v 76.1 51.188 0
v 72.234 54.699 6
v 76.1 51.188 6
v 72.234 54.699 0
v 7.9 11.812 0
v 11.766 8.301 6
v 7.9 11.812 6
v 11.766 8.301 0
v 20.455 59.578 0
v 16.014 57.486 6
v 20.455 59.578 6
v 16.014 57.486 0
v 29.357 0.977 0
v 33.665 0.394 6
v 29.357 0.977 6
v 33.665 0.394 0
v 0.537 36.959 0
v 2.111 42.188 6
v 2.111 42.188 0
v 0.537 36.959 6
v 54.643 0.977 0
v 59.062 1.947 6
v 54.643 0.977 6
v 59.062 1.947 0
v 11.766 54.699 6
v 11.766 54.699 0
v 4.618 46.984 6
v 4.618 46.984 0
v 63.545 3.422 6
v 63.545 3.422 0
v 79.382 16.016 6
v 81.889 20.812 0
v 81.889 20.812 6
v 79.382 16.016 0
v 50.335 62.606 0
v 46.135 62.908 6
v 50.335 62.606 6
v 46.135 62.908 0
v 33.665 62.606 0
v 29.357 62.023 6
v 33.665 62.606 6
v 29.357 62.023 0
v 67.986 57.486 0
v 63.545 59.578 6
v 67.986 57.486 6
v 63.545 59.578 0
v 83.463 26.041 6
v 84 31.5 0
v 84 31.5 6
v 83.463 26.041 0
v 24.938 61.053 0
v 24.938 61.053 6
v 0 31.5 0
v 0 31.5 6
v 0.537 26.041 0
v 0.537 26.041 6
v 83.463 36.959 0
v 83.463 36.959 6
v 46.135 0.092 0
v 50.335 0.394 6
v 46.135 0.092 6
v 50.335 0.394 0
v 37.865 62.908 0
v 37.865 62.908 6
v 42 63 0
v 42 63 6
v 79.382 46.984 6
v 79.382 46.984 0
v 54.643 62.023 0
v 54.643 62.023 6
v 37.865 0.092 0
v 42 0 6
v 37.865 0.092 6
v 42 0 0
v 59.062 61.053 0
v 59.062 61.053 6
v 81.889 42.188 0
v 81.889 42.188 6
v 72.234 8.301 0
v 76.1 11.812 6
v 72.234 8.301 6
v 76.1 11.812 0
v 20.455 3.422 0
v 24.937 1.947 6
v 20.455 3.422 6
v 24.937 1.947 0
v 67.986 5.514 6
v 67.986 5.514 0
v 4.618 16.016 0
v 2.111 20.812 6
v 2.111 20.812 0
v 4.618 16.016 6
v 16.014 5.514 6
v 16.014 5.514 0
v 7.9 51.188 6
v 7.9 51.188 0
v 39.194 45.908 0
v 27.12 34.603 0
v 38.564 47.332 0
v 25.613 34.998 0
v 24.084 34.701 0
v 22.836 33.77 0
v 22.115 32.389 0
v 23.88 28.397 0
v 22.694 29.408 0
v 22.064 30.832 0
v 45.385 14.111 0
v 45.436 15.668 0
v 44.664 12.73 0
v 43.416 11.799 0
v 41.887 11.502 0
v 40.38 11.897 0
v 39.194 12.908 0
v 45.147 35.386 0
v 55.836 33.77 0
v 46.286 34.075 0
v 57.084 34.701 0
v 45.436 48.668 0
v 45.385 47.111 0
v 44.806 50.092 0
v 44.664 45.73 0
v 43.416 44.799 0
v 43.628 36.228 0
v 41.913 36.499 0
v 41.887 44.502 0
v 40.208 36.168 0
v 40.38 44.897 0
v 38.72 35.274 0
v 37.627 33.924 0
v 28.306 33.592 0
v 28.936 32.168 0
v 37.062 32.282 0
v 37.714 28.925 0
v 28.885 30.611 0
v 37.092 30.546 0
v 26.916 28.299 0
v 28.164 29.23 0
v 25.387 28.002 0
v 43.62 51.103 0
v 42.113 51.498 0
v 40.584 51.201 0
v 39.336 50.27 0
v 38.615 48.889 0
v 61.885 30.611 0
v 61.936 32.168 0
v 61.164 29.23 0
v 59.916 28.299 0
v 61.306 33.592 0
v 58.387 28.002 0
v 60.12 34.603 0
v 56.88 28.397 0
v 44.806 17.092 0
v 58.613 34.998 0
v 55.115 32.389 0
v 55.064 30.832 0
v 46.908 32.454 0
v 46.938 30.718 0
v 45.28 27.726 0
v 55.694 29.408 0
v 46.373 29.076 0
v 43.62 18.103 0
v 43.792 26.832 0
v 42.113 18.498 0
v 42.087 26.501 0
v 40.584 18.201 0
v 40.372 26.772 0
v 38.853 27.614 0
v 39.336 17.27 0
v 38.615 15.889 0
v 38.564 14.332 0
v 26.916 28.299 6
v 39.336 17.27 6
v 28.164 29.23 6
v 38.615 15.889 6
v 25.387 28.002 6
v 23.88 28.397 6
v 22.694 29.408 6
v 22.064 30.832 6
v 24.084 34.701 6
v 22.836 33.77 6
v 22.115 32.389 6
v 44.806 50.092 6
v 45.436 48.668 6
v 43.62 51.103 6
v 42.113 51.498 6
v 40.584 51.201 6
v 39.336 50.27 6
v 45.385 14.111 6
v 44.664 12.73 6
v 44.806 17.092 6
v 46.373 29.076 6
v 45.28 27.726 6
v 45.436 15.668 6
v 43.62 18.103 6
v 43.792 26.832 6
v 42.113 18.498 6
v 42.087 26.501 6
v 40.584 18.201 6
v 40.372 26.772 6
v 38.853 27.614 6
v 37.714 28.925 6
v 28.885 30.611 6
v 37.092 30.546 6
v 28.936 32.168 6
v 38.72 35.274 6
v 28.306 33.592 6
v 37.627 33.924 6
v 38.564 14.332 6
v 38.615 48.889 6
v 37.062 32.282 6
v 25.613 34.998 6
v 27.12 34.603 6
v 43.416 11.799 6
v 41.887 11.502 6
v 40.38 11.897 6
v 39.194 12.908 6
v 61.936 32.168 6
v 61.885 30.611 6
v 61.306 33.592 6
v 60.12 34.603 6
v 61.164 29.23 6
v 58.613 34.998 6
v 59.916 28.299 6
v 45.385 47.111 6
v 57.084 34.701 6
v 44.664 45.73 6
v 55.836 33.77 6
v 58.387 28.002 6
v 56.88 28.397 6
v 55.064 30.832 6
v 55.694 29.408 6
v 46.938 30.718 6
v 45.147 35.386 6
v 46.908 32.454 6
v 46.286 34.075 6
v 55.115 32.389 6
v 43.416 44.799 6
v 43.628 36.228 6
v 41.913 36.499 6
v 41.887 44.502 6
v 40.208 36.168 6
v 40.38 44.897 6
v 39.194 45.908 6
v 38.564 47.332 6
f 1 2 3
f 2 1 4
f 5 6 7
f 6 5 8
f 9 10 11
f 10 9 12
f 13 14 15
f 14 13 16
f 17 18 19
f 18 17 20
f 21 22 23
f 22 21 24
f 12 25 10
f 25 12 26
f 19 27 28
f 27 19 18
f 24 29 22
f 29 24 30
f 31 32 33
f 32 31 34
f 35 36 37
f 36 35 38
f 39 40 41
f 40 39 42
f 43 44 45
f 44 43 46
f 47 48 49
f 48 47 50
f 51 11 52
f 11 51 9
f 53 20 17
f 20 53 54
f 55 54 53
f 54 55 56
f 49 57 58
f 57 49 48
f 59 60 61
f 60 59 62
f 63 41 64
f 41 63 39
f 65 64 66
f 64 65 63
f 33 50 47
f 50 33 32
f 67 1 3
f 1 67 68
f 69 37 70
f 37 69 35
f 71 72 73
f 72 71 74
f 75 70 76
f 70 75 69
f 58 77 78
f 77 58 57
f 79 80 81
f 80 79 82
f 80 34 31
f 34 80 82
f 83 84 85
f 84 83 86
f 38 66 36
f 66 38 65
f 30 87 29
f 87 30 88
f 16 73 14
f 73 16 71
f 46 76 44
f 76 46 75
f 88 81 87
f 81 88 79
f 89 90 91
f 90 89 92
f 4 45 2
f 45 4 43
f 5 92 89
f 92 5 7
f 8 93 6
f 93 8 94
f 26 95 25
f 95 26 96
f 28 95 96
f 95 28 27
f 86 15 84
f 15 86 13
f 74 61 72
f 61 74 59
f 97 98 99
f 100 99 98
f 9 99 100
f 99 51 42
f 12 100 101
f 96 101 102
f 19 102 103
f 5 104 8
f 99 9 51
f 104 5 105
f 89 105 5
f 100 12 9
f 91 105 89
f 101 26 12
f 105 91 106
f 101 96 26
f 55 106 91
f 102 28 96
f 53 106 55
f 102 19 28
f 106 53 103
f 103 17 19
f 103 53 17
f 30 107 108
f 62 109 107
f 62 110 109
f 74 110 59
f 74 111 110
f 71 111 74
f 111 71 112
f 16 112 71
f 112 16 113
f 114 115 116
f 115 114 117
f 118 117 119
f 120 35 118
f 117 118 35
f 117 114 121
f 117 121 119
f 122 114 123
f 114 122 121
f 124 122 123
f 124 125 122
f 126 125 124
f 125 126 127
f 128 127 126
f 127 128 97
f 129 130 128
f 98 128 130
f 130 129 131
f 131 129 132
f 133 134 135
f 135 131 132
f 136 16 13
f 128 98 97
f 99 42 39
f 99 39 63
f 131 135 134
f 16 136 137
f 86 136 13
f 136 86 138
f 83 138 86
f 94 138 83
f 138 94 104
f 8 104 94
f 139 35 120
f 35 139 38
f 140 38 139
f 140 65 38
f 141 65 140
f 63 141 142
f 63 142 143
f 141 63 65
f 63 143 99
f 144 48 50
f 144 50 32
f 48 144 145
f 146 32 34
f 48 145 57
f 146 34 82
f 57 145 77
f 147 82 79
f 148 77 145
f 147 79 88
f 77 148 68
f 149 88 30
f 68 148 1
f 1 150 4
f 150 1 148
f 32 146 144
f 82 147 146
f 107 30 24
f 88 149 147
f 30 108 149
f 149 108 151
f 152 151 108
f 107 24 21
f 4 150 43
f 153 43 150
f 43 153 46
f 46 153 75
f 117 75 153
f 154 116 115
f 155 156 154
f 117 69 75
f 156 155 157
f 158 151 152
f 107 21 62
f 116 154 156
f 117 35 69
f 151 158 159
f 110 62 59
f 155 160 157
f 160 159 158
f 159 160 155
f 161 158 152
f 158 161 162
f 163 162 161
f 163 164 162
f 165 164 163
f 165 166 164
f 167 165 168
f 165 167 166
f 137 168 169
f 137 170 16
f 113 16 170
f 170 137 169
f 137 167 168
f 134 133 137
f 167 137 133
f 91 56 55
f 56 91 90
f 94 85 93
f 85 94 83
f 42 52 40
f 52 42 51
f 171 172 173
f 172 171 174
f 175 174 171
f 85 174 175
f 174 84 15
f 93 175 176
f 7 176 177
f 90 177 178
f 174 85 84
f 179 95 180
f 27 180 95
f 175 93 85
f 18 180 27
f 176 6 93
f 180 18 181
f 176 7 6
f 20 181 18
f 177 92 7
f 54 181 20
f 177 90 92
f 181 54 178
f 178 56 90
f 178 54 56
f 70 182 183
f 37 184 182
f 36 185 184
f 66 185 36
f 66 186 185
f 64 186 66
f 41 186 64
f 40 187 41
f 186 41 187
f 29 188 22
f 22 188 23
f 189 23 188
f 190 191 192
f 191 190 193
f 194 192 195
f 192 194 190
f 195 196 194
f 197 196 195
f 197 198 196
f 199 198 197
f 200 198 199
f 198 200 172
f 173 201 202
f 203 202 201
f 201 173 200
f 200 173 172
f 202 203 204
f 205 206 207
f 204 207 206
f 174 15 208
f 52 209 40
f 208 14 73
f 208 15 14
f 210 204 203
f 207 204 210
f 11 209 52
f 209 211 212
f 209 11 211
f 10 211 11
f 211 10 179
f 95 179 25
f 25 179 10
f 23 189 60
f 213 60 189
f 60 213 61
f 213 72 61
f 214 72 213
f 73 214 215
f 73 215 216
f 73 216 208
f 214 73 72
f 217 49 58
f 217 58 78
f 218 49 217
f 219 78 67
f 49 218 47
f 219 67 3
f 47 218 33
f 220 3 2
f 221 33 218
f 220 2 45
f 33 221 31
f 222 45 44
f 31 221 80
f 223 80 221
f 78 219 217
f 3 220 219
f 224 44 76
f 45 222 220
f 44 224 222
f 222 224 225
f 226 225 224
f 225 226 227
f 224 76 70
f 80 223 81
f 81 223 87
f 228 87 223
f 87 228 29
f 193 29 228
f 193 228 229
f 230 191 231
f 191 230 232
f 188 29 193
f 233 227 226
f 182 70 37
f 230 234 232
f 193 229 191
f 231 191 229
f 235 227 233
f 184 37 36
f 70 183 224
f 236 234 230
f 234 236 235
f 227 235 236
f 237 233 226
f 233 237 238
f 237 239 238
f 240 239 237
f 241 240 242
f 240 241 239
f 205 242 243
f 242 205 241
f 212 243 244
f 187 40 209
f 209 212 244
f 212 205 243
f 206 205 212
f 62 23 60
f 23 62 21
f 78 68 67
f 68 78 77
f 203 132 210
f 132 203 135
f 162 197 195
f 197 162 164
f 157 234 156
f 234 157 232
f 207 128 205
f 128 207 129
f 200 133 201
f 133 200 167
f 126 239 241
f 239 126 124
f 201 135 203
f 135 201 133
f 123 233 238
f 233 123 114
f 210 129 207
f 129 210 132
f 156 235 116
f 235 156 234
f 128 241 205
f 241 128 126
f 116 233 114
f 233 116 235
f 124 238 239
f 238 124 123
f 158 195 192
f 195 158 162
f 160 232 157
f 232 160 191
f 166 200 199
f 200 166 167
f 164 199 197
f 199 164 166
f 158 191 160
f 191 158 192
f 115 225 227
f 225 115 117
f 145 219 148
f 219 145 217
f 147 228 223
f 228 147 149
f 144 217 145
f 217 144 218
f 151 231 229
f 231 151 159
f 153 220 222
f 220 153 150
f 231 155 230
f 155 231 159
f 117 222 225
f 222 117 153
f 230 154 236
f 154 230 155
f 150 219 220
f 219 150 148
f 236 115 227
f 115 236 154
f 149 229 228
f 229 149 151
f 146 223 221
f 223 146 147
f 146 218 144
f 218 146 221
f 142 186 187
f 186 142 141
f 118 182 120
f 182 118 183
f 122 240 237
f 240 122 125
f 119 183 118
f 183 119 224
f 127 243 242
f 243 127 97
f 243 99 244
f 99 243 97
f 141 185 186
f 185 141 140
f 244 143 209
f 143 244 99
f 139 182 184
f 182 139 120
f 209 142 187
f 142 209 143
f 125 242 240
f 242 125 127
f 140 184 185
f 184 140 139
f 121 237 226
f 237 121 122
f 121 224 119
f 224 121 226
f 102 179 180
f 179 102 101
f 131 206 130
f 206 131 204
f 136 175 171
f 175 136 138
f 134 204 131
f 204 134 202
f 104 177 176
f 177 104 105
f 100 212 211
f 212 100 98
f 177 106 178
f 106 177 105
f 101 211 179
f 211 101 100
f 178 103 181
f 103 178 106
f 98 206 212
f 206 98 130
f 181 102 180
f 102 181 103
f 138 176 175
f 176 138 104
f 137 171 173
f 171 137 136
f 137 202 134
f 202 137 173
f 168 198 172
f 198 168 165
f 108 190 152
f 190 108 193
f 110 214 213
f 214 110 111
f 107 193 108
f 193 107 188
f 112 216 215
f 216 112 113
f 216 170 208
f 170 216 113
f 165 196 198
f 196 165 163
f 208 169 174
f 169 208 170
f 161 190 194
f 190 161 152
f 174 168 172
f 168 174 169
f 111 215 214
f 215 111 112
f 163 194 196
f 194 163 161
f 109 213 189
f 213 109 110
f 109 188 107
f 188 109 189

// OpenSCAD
$fn = 32;

// ----------------------------------------------------------------------
// Cam plate: double_lobe cam, base R28
// ----------------------------------------------------------------------

// --- parameters (mm) ---
base_r = 28;              // base circle radius
lobe_h = 14;              // cam lobe rise
bore_r = 5;               // shaft bore radius
plate_t = 6;              // plate thickness, Z (extrusion height)
ring_r = 16.5;            // lightening ring radius
bolt_r = 3.5;             // lightening hole radius

profile = [[84, 31.5], [83.463, 36.959], [81.889, 42.188], [79.382, 46.984], [76.1, 51.188], [72.234, 54.699], [67.986, 57.486], [63.545, 59.578], [59.062, 61.053], [54.643, 62.023], [50.335, 62.606], [46.135, 62.908], [42, 63], [37.865, 62.908], [33.665, 62.606], [29.357, 62.023], [24.938, 61.053], [20.455, 59.578], [16.014, 57.486], [11.766, 54.699], [7.9, 51.188], [4.618, 46.984], [2.111, 42.188], [0.537, 36.959], [0, 31.5], [0.537, 26.041], [2.111, 20.812], [4.618, 16.016], [7.9, 11.812], [11.766, 8.301], [16.014, 5.514], [20.455, 3.422], [24.937, 1.947], [29.357, 0.977], [33.665, 0.394], [37.865, 0.092], [42, 0], [46.135, 0.092], [50.335, 0.394], [54.643, 0.977], [59.062, 1.947], [63.545, 3.422], [67.986, 5.514], [72.234, 8.301], [76.1, 11.812], [79.382, 16.016], [81.889, 20.812], [83.463, 26.041]];  // primary outline, 48 points, counter clockwise
void_1 = [[46.908, 32.454], [46.286, 34.075], [45.147, 35.386], [43.628, 36.228], [41.913, 36.499], [40.208, 36.168], [38.72, 35.274], [37.627, 33.924], [37.062, 32.282], [37.092, 30.546], [37.714, 28.925], [38.853, 27.614], [40.372, 26.772], [42.087, 26.501], [43.792, 26.832], [45.28, 27.726], [46.373, 29.076], [46.938, 30.718]];  // shaft bore, 18 points
void_2 = [[61.936, 32.168], [61.306, 33.592], [60.12, 34.603], [58.613, 34.998], [57.084, 34.701], [55.836, 33.77], [55.115, 32.389], [55.064, 30.832], [55.694, 29.408], [56.88, 28.397], [58.387, 28.002], [59.916, 28.299], [61.164, 29.23], [61.885, 30.611]];  // lightening hole 1, 14 points
void_3 = [[45.436, 48.668], [44.806, 50.092], [43.62, 51.103], [42.113, 51.498], [40.584, 51.201], [39.336, 50.27], [38.615, 48.889], [38.564, 47.332], [39.194, 45.908], [40.38, 44.897], [41.887, 44.502], [43.416, 44.799], [44.664, 45.73], [45.385, 47.111]];  // lightening hole 2, 14 points
void_4 = [[28.936, 32.168], [28.306, 33.592], [27.12, 34.603], [25.613, 34.998], [24.084, 34.701], [22.836, 33.77], [22.115, 32.389], [22.064, 30.832], [22.694, 29.408], [23.88, 28.397], [25.387, 28.002], [26.916, 28.299], [28.164, 29.23], [28.885, 30.611]];  // lightening hole 3, 14 points
void_5 = [[45.436, 15.668], [44.806, 17.092], [43.62, 18.103], [42.113, 18.498], [40.584, 18.201], [39.336, 17.27], [38.615, 15.889], [38.564, 14.332], [39.194, 12.908], [40.38, 11.897], [41.887, 11.502], [43.416, 11.799], [44.664, 12.73], [45.385, 14.111]];  // lightening hole 4, 14 points

// --- the one profile operation ---
difference() {
  linear_extrude(height = plate_t) polygon(points = profile);
  translate([0, 0, -1])
    linear_extrude(height = plate_t + 2) polygon(points = void_1);
  translate([0, 0, -1])
    linear_extrude(height = plate_t + 2) polygon(points = void_2);
  translate([0, 0, -1])
    linear_extrude(height = plate_t + 2) polygon(points = void_3);
  translate([0, 0, -1])
    linear_extrude(height = plate_t + 2) polygon(points = void_4);
  translate([0, 0, -1])
    linear_extrude(height = plate_t + 2) polygon(points = void_5);
}
